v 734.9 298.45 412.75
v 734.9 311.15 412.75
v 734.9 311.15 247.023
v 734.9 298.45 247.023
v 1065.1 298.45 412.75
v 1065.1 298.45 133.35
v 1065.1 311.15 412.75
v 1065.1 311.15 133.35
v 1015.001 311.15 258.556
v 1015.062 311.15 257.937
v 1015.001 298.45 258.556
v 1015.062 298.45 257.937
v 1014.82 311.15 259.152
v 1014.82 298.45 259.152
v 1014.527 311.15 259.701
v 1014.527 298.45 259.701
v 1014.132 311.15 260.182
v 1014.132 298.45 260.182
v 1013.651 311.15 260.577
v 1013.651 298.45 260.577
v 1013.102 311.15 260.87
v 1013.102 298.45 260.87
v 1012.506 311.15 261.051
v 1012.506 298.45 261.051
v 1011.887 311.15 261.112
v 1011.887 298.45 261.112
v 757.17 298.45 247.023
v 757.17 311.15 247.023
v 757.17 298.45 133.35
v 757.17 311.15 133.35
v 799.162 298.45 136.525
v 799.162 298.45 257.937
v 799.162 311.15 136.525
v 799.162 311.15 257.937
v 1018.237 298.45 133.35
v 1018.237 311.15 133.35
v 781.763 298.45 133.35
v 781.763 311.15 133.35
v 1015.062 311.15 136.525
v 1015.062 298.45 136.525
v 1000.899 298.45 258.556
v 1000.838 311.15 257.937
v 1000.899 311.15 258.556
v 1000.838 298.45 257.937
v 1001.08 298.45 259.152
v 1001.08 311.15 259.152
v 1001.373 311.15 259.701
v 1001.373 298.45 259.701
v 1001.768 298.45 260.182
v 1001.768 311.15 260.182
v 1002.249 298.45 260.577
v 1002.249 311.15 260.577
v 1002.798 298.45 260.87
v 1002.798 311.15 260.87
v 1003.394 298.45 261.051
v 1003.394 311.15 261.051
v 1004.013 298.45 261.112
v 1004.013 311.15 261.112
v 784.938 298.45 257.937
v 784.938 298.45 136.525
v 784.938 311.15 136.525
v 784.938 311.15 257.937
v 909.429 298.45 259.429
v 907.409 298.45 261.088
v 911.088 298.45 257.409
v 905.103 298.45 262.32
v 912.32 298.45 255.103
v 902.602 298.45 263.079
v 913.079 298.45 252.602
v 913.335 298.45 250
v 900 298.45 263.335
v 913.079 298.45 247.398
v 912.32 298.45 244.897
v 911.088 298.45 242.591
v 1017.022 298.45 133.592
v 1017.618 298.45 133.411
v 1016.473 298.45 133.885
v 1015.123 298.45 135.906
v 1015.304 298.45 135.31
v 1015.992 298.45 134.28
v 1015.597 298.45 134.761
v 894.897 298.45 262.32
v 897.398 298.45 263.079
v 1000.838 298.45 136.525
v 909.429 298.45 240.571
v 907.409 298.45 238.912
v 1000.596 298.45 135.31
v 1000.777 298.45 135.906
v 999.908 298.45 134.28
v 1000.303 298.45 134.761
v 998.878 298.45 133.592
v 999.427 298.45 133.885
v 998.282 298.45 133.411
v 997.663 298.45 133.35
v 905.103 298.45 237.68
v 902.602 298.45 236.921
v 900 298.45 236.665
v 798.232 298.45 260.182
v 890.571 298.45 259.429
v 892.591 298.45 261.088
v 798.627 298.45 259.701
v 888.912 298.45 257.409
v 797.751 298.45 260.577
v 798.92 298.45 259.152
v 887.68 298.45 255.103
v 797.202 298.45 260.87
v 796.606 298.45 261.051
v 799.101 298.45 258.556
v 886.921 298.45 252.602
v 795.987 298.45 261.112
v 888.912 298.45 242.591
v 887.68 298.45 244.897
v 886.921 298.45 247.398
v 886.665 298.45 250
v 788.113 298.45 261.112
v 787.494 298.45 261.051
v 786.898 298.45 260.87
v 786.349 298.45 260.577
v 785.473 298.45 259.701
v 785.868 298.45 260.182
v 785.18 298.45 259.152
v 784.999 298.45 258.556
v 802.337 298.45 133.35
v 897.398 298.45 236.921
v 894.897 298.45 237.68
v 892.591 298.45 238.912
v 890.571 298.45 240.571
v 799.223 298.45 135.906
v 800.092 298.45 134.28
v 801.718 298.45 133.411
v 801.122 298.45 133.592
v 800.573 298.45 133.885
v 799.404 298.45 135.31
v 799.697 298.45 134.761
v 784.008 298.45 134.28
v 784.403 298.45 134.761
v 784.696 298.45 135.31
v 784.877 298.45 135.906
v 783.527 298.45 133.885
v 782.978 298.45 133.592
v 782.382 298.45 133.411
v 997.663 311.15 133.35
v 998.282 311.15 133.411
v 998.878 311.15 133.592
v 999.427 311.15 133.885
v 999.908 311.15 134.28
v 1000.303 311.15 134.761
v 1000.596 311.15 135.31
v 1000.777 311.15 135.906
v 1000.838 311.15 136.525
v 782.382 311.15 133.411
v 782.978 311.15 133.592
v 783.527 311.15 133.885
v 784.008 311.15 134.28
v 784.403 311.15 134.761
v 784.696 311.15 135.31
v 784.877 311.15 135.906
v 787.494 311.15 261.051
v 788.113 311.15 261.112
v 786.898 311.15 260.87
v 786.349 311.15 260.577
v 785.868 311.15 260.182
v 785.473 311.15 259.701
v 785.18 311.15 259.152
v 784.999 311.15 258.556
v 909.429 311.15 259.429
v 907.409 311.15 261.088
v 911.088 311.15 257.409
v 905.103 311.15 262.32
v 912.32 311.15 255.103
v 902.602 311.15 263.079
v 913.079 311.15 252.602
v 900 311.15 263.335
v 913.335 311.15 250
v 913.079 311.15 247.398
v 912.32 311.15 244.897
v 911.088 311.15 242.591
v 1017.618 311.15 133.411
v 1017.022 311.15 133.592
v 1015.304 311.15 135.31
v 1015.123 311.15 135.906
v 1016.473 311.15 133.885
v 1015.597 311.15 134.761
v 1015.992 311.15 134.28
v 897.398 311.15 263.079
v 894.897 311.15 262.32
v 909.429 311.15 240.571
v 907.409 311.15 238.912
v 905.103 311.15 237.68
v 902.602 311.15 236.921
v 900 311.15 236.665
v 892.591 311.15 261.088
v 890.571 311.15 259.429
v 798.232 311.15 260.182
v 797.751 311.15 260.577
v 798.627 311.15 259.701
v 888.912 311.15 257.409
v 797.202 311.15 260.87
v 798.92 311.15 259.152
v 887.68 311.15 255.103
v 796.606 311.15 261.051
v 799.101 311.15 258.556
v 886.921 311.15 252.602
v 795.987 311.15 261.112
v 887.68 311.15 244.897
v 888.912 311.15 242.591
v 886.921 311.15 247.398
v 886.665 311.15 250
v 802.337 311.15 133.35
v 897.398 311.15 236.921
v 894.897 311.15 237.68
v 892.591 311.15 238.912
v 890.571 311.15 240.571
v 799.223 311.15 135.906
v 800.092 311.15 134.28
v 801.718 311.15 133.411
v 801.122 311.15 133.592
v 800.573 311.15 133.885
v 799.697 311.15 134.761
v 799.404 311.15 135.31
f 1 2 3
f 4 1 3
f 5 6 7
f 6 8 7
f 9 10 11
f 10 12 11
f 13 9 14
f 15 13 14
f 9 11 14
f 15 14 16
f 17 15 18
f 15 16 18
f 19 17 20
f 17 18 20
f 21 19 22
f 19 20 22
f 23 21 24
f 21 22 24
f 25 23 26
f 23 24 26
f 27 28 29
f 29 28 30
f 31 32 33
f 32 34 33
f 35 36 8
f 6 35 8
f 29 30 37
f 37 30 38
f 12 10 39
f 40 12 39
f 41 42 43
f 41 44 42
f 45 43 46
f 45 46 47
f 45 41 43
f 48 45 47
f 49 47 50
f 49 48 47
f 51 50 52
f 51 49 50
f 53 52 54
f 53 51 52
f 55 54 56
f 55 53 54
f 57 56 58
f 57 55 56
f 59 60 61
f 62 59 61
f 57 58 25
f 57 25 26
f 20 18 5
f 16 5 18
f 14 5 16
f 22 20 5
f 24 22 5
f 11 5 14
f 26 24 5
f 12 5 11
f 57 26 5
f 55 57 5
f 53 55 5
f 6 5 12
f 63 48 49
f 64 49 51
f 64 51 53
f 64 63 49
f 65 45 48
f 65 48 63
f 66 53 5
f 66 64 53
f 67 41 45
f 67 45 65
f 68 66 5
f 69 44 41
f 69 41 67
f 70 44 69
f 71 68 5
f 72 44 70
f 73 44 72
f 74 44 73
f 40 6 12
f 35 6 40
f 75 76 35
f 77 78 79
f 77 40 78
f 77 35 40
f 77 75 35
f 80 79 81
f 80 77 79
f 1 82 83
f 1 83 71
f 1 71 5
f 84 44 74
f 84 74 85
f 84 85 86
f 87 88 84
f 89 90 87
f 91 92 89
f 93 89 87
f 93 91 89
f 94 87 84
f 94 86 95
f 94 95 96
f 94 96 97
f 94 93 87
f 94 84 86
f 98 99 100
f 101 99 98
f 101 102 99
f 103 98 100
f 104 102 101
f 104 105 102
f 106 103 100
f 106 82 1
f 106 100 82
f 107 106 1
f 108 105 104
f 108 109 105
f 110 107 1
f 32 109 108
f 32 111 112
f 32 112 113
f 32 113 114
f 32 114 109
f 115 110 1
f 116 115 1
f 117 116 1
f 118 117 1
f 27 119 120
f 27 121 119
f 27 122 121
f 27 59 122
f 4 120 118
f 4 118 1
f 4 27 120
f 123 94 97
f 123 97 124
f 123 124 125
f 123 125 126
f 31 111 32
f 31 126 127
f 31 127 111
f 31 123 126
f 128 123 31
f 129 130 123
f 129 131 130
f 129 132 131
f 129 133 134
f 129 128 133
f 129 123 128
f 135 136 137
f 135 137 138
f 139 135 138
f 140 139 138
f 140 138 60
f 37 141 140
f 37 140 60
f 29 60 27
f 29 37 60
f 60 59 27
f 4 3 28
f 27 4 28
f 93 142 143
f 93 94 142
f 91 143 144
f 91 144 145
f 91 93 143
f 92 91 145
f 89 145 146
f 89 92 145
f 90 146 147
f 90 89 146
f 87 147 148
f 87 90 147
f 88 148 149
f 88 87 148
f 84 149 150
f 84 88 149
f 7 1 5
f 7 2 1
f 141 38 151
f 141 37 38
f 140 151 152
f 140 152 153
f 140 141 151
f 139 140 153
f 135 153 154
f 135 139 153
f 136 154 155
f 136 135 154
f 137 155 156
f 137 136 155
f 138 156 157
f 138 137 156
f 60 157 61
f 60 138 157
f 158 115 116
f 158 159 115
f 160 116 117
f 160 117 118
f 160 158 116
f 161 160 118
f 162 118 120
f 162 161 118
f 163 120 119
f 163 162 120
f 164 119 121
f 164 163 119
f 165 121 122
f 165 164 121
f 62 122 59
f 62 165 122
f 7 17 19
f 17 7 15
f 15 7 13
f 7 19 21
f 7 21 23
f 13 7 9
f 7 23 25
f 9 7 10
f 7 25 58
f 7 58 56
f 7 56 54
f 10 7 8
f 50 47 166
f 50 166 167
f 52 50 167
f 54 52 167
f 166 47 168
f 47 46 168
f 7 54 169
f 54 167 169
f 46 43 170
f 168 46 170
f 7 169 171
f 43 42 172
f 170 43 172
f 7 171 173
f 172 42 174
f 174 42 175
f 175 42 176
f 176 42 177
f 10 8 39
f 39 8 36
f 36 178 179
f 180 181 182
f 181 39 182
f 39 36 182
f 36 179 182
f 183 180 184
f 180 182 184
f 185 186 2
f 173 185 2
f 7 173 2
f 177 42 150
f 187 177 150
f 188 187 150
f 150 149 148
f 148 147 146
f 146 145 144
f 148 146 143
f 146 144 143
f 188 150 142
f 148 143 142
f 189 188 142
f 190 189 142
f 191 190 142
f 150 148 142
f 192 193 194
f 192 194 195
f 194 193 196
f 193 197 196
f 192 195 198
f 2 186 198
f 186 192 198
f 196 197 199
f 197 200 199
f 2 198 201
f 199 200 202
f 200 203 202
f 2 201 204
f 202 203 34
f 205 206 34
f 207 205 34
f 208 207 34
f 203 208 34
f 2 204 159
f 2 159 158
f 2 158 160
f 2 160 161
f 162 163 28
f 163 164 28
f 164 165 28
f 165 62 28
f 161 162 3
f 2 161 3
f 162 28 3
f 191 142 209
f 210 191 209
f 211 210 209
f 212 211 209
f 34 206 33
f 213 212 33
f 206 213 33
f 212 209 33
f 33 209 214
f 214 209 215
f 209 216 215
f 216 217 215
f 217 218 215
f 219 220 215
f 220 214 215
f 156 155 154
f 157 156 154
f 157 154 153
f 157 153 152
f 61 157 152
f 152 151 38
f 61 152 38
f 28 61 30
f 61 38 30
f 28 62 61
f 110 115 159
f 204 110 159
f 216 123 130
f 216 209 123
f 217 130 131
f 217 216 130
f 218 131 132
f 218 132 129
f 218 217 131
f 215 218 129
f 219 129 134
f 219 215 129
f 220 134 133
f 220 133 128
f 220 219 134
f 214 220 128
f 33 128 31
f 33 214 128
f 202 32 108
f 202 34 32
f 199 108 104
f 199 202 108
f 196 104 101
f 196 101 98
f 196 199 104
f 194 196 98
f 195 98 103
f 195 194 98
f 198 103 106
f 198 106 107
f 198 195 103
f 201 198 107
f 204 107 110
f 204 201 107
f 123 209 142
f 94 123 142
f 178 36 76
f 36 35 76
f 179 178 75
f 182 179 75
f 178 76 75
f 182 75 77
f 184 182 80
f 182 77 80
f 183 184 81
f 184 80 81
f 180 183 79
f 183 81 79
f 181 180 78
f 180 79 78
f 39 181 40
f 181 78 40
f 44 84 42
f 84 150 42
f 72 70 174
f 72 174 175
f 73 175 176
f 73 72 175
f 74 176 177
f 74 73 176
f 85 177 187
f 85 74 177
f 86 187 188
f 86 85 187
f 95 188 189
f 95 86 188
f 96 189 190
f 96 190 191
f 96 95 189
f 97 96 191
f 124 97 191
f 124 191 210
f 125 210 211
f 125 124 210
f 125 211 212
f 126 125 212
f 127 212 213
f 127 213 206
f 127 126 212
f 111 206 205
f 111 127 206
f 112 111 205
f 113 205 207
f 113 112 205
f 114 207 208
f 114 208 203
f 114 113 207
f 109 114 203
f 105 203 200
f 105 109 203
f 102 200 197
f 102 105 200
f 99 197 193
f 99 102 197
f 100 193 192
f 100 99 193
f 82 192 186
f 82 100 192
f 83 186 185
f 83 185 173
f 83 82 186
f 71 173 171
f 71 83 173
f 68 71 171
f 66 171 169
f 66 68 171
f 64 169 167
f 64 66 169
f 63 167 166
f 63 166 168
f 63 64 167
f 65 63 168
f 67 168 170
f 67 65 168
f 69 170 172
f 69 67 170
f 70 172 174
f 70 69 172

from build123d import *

# Parameters (mm, degrees)
BOSS_EXTRUDE1_DEPTH  = 6.35
CAVITY1_START        = 298.45
CAVITY1_OUTLINE_R    = 12.7
CAVITY1_DEPTH        = 12.7
CAVITY1_START_2      = 720.91620239
CAVITY1_2_DEPTH      = 22.43918751
SKETCH2_W            = 22.270177668
SKETCH2_H            = 113.672619585
CUT_EXTRUDE1_DEPTH   = 1143.349273427
MOVE_FACE_SLOTS_BY   = 0.762
MOVE_FACE_SLOTS_2_BY = 0.762
MOVE_FACE_SLOTS_3_BY = 0.762
MOVE_FACE_SLOTS_4_BY = 0.762
MOVE_FACE_SLOTS_5_BY = 0.762
MOVE_FACE_SLOTS_6_BY = 0.762
MOVE_FACE_HOLE_BY    = 0.635
SLOT_FILLET_R        = 3.175


# Read off the part's stored shape, not the designer's step: Cavity1
with BuildPart() as part:
    # Sketch1 → Boss-Extrude1 (new, symmetric)
    with BuildSketch(Plane(origin=(0, 304.8, 0), x_dir=(1, 0, 0), z_dir=(0, 1, 0))):
        Polygon((798.4, -133.35), (1001.6, -133.35), (1001.6, -260.35), (1014.3, -260.35), (1014.3, -133.35), (1065.1, -133.35), (1065.1, -412.75), (1014.3, -412.75), (1001.6, -412.75), (798.4, -412.75), (785.7, -412.75), (734.9, -412.75), (734.9, -133.35), (785.7, -133.35), (785.7, -260.35), (798.4, -260.35), align=None)
    extrude(amount=BOSS_EXTRUDE1_DEPTH, both=True)

    # Cavity1 outline → Cavity1 (cut)
    with BuildSketch(Plane(origin=(0, 0, 0), x_dir=(1, 0, 0), z_dir=(0, 1, 0)).offset(CAVITY1_START)):
        with Locations((900, -250)):
            Circle(CAVITY1_OUTLINE_R)
    extrude(amount=CAVITY1_DEPTH, mode=Mode.SUBTRACT)

    # Cavity1 2 outline → Cavity1 2 (cut)
    with BuildSketch(Plane(origin=(0, 0, 0), x_dir=(0.7149295353100829, -0.698752516444498, 0.02491345627949748), z_dir=(0.6991965099607612, 0.7144755512387372, -0.025474048378572107)).offset(CAVITY1_START_2)):
        with BuildLine():
            Line((312, -255.374549574), (314.076314529, -255.435688643))
            ThreePointArc((314.076314529, -255.435688643), (327.146171675, -242.424687318), (313.444242413, -230.081087528))
            Line((313.444242413, -230.081087528), (312, -230.195835843))
            Line((312, -230.195835843), (312, -255.374549574))
        make_face()
    extrude(amount=CAVITY1_2_DEPTH, mode=Mode.SUBTRACT)

    # Sketch2 → Cut-Extrude1 (cut, through all)
    with BuildSketch(Plane(origin=(0, 311.15, 0), x_dir=(1, 0, 0), z_dir=(0, 1, 0))):
        with Locations((746.035088834, -190.186309793)):
            Rectangle(SKETCH2_W, SKETCH2_H)
    extrude(amount=-CUT_EXTRUDE1_DEPTH, mode=Mode.SUBTRACT)

    # Move Face Slots: a face moved inward by 0.762
    extrude(part.faces().sort_by_distance((1014.3, 304.8, 196.85))[0], amount=MOVE_FACE_SLOTS_BY, dir=(1, 0, 0), mode=Mode.SUBTRACT)

    # Move Face Slots 2: a face moved inward by 0.762
    extrude(part.faces().sort_by_distance((1007.95, 304.8, 260.35))[0], amount=MOVE_FACE_SLOTS_2_BY, dir=(0, 0, 1), mode=Mode.SUBTRACT)

    # Move Face Slots 3: a face moved inward by 0.762
    extrude(part.faces().sort_by_distance((1001.6, 304.8, 196.85))[0], amount=MOVE_FACE_SLOTS_3_BY, dir=(-1, 0, 0), mode=Mode.SUBTRACT)

    # Move Face Slots 4: a face moved inward by 0.762
    extrude(part.faces().sort_by_distance((785.7, 304.8, 196.85))[0], amount=MOVE_FACE_SLOTS_4_BY, dir=(-1, 0, 0), mode=Mode.SUBTRACT)

    # Move Face Slots 5: a face moved inward by 0.762
    extrude(part.faces().sort_by_distance((792.05, 304.8, 260.35))[0], amount=MOVE_FACE_SLOTS_5_BY, dir=(0, 0, 1), mode=Mode.SUBTRACT)

    # Move Face Slots 6: a face moved inward by 0.762
    extrude(part.faces().sort_by_distance((798.4, 304.8, 196.85))[0], amount=MOVE_FACE_SLOTS_6_BY, dir=(1, 0, 0), mode=Mode.SUBTRACT)

    # Move Face Hole: a curved face moved inward by 0.635
    add(Solid.thicken(part.faces().sort_by_distance((887.3, 304.8, 250))[0], -MOVE_FACE_HOLE_BY), mode=Mode.SUBTRACT)

    # Slot Fillet
    slot_fillet_edges = [part.edges().sort_by_distance(p)[0] for p in [
        (1015.062, 304.8, 133.35),
        (1015.062, 304.8, 261.112),
        (1000.838, 304.8, 261.112),
        (1000.838, 304.8, 133.35),
        (799.162, 304.8, 133.35),
        (799.162, 304.8, 261.112),
        (784.938, 304.8, 261.112),
        (784.938, 304.8, 133.35),
    ]]
    fillet(slot_fillet_edges, radius=SLOT_FILLET_R)


solid = part.part
